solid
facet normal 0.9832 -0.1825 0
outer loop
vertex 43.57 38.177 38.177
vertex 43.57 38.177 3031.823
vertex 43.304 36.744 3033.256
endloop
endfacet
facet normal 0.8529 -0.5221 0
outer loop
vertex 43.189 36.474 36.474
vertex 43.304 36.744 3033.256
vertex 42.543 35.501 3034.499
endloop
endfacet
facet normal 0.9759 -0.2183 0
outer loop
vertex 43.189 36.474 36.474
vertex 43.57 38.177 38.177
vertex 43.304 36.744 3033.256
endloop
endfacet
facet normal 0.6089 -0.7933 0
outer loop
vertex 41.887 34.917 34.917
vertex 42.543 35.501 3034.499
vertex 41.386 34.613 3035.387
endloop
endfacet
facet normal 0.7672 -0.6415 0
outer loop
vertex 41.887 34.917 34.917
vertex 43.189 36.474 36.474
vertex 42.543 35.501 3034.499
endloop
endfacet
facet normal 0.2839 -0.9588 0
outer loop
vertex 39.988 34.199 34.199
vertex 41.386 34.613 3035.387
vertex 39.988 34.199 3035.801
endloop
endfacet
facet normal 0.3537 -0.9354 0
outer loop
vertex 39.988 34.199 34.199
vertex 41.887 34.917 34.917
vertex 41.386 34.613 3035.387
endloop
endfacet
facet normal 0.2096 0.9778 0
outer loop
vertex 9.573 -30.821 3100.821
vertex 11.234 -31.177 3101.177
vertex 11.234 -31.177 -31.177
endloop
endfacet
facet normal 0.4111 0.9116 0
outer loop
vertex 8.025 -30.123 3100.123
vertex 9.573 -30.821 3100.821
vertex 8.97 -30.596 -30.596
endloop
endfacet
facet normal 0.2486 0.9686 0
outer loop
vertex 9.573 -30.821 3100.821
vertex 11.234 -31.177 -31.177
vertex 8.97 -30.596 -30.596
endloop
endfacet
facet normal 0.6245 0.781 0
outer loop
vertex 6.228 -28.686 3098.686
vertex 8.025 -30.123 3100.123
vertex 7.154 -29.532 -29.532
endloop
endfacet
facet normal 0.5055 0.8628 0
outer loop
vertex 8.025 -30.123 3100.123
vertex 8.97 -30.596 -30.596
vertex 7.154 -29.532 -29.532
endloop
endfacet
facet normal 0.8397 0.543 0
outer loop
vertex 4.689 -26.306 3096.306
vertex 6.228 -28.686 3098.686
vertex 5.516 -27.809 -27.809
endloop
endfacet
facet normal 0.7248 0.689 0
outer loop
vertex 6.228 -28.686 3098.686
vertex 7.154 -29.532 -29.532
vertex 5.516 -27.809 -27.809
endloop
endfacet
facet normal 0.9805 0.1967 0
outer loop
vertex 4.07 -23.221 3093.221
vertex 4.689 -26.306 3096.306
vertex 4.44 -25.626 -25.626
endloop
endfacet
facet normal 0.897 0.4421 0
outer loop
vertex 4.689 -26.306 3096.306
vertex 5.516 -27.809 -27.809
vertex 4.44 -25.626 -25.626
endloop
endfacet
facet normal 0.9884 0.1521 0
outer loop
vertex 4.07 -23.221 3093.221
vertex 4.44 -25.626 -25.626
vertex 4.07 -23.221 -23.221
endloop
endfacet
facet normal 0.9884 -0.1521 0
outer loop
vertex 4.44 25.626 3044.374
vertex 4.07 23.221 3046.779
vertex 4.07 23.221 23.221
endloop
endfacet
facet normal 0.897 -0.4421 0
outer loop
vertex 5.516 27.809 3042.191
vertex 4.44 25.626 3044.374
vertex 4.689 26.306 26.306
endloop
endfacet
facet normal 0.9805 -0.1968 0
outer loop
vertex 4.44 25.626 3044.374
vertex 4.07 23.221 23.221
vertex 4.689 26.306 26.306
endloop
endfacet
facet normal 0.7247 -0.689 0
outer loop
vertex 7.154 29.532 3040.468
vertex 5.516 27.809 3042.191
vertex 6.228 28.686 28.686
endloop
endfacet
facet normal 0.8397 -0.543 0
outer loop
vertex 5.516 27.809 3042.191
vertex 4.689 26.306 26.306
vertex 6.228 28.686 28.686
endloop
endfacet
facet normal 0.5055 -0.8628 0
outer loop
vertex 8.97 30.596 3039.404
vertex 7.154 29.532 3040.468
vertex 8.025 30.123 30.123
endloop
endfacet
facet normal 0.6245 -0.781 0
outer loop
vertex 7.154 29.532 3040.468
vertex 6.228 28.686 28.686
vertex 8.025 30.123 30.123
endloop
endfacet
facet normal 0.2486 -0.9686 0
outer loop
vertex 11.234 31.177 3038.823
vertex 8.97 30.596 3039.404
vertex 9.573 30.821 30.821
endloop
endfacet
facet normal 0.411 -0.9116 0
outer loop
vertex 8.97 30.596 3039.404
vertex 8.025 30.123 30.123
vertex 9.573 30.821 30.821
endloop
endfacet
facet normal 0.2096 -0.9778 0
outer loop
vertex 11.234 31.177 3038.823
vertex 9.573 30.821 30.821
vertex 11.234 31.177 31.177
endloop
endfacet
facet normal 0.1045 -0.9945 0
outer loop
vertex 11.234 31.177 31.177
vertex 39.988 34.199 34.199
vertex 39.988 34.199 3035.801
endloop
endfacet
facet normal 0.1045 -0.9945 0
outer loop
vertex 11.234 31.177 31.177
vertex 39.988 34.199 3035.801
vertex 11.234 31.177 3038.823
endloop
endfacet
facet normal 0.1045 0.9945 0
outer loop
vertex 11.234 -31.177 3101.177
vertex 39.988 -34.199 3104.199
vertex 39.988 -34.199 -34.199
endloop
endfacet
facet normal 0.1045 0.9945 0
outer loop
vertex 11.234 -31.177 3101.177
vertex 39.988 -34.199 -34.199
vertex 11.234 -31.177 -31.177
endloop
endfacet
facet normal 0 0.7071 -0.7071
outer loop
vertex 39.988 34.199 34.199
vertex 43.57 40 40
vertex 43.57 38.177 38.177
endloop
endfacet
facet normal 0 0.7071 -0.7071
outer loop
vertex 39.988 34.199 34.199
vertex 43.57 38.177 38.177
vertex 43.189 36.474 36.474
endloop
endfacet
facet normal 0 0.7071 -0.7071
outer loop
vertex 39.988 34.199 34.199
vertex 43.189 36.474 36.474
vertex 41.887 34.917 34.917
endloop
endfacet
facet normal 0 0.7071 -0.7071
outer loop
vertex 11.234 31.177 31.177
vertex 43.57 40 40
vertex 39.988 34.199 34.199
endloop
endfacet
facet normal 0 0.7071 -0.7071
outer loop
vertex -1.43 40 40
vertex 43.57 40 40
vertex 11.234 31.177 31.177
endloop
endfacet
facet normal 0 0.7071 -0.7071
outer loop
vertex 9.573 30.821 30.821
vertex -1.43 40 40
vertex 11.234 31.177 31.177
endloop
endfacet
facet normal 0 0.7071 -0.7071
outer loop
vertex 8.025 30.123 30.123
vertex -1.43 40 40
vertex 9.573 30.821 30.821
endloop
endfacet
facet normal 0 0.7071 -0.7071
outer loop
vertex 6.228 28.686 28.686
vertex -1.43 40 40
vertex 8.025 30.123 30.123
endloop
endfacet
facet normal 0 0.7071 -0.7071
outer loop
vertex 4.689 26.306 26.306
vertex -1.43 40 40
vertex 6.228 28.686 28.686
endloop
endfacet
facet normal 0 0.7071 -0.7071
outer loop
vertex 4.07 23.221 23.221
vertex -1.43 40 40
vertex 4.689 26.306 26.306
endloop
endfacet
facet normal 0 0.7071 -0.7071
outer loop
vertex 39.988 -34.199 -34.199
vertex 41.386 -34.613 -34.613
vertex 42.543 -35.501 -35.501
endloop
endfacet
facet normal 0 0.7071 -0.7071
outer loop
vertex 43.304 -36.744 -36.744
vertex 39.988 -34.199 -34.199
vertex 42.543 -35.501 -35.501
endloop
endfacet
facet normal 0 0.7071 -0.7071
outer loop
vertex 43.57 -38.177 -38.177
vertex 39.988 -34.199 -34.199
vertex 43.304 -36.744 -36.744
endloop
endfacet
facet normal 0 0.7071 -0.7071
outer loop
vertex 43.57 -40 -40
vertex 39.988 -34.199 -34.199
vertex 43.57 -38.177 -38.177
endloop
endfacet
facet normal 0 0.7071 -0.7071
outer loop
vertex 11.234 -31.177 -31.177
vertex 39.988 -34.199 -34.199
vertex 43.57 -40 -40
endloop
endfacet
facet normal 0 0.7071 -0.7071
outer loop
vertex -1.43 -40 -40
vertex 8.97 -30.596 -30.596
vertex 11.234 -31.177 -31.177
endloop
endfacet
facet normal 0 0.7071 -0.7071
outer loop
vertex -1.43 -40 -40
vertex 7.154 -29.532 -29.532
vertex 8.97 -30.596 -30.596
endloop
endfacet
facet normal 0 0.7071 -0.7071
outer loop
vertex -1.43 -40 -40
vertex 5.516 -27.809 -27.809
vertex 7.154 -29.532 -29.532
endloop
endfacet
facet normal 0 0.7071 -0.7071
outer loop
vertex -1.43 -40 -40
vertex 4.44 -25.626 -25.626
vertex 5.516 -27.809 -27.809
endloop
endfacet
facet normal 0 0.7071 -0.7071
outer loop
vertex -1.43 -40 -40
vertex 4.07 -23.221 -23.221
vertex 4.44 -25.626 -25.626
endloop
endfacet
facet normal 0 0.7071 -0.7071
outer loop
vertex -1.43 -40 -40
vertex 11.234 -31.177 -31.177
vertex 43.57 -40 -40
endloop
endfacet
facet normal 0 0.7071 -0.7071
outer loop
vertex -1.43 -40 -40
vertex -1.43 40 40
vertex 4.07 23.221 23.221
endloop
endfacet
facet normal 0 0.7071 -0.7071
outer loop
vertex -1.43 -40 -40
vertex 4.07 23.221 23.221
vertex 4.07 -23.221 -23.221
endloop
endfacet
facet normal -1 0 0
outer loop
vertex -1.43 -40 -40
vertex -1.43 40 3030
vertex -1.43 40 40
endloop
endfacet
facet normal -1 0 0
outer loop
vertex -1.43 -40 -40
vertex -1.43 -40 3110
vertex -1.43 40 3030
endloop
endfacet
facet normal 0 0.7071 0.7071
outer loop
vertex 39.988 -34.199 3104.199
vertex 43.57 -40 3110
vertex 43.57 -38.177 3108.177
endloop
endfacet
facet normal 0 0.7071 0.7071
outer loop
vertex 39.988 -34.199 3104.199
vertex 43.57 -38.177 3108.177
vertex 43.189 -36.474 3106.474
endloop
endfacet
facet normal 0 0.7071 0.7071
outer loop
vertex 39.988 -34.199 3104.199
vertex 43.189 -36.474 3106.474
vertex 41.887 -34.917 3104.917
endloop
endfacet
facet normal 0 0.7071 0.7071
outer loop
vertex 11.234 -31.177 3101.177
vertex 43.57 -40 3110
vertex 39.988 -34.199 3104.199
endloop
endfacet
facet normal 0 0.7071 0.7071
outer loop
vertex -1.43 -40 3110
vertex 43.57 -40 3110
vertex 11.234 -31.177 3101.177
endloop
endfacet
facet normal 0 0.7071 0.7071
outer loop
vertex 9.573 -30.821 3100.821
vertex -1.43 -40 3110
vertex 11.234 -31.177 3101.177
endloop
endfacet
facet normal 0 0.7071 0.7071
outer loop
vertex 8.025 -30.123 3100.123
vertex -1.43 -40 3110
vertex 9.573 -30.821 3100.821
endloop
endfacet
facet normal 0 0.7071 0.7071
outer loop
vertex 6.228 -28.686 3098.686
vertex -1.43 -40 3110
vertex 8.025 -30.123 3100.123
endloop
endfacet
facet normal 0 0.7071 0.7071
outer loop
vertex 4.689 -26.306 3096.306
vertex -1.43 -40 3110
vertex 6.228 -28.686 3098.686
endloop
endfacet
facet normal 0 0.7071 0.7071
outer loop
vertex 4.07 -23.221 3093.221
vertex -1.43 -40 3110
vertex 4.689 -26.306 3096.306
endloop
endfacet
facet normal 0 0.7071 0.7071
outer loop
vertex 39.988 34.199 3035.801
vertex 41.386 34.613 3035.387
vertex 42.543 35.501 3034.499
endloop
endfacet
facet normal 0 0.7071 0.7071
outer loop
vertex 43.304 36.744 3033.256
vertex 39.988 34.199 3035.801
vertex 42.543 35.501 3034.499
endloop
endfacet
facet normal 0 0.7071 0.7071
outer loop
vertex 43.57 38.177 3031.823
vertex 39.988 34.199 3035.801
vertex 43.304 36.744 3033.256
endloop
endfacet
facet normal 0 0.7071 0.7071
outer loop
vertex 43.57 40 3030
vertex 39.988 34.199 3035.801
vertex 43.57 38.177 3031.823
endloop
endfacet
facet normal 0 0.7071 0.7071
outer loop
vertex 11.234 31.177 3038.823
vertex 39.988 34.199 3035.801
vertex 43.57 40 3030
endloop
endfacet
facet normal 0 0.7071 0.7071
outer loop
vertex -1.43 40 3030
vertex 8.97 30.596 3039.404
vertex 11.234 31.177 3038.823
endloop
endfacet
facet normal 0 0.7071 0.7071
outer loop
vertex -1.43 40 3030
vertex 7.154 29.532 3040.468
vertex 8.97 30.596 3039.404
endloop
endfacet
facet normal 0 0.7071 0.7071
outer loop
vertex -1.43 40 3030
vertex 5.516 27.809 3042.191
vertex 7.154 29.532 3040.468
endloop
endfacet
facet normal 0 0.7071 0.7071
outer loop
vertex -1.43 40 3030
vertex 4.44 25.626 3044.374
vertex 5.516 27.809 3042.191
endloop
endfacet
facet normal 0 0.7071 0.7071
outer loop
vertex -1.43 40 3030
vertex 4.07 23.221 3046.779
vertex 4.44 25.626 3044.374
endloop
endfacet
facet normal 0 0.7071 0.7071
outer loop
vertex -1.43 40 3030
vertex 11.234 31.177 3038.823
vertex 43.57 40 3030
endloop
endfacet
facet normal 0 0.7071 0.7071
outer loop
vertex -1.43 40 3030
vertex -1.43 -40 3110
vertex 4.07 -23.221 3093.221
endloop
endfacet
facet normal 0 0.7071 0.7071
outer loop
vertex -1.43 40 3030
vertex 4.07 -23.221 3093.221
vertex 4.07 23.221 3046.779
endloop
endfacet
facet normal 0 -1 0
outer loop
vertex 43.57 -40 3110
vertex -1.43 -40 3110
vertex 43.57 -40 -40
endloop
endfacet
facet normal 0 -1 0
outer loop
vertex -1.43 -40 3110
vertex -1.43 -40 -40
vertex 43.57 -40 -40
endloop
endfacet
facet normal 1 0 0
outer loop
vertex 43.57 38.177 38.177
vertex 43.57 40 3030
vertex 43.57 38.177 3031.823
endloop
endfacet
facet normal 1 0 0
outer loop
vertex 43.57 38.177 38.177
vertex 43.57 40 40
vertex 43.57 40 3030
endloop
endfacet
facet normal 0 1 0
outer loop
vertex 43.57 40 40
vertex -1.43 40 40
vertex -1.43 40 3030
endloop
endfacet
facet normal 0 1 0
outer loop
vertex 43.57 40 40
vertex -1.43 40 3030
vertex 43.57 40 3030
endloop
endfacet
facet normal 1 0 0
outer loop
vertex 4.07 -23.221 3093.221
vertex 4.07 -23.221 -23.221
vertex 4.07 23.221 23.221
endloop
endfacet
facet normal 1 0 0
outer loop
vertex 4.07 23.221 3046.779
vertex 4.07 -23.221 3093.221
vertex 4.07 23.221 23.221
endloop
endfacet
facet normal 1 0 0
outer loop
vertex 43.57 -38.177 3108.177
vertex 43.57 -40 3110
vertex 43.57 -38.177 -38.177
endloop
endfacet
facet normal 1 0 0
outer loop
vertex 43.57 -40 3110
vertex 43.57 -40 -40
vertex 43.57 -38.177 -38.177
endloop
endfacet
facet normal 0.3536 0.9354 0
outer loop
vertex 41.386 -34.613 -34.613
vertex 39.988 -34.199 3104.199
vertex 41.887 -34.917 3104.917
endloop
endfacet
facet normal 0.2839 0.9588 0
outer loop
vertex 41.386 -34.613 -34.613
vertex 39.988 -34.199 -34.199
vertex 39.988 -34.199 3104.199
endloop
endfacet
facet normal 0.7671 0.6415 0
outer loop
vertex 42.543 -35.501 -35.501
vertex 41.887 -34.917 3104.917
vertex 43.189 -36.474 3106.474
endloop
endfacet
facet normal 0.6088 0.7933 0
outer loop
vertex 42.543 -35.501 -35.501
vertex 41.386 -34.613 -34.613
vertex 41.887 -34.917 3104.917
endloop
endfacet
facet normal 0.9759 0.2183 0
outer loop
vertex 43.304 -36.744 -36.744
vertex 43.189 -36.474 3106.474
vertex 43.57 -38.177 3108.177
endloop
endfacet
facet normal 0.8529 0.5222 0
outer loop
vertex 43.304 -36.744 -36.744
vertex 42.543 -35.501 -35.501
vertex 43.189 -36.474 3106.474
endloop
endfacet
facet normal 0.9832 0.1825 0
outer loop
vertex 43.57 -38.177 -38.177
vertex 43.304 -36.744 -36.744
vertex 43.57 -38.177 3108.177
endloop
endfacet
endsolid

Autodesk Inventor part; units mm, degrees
ref_plane "Начальная плоскость" through (0, 0, -40) normal (0, 0, 1) x (1, 0, 0)
ref_plane "Конечная плоскость" through (0, 0, 3110) normal (0, 0, 1) x (1, 0, 0)
sketch "Эскиз" plane through (0, 0, 0) normal (0, 0, 1) x (1, 0, 0)
  line L0 (-1.43, 0) -> (-1.43, 40)
  line L1 (-1.43, 40) -> (43.57, 40)
  line L2 (43.57, 40) -> (43.57, 38.1774)
  line L3 (39.9881, 34.1993) -> (11.2338, 31.1771)
  line L4 (4.07, 23.221) -> (4.07, 0)
  line L5 (4.07, 0) -> (-1.43, 0) construction
  line L6 (23.82, 40) -> (23.82, 32.5) construction
  line L7 (43.57, 34.5758) -> (43.57, 32.5) construction
  line L8 (43.57, 32.5) -> (23.82, 32.5) construction
  line L9 (0, 15) -> (0, -27) construction
  line L10 (-5.539, 0) -> (16.0067, 0) construction
  line L11 (-1.43, 0) -> (-1.43, -40)
  line L12 (-1.43, -40) -> (43.57, -40)
  line L13 (43.57, -40) -> (43.57, -38.1774)
  line L14 (39.9881, -34.1993) -> (11.2338, -31.1771)
  line L15 (4.07, -23.221) -> (4.07, 0)
  arc A0 (11.2338, 31.1771) -> (4.07, 23.221) centre (12.07, 23.221) ccw
  arc A1 (4.07, -23.221) -> (11.2338, -31.1771) centre (12.07, -23.221) ccw
  arc A2 (39.9881, 34.1993) -> (43.57, 38.1774) centre (39.57, 38.1774) ccw
  arc A3 (43.57, -38.1774) -> (39.9881, -34.1993) centre (39.57, -38.1774) ccw
  line L16 (0, 56) -> (0, -56) construction
  line L17 (-15.5135, 0) -> (54.308, 0) construction
  point P0 (4.07, 30.4242)
  point P1 (43.57, -34.5758)
  point P2 (4.07, -30.4242)
  point P3 (23.82, -40)
  point P4 (23.82, -32.5)
  dimension "d0" = 5.5
  dimension "d1" = 40
  dimension "d2" = 45
  dimension "d3" = 7.5
  dimension "d4" = 19.75
  dimension "d5" = 2.0758
  dimension "d23" = 8
  dimension "d24" = 4
  dimension "d25" = 1.43
extrude "Тело" add sketch "Эскиз" along normal up to surface (3150 mm away) from surface at -40
sketch "Sketch3" plane through (0, 0, 0) normal (0, 0, 1) x (1, 0, 0)
  line L0 (0, 0) -> (10, 0)
ref_plane "Work Plane3" through (0, 0, 0) normal (0, -1, 0) x (1, 0, 0)
sketch "Sketch4" plane through (0, 0, 0) normal (0, -1, 0) x (1, 0, 0)
  line L0 (-2, -40) -> (12, -40)
  line L1 (-2, 3110) -> (12, 3110)
  dimension "d29" = 3150
ref_plane "РабПлоскость4" through (21.07, -40, -40) normal (0, 0.7071, -0.7071) x (1, 0, 0)
split "Разделение1" plane through (21.07, -40, -40) removes the side toward (0, 0.7071, -0.7071)
ref_plane "РабПлоскость5" through (21.07, -40, 3110) normal (0, 0.7071, 0.7071) x (1, 0, 0)
split "Разделение2" plane through (21.07, -40, 3110) removes the side toward (0, 0.7071, 0.7071)
equation "\"d0\" = G_T"
equation "\"d1\" = 0.5 * G_H"
equation "\"d2\" = G_W"
equation "\"d3\" = G_T1"
equation "\"d4\" = G_C"
equation "\"d23\" = G_IR"
equation "\"d24\" = G_ER"
equation "\"d25\" = ex"
equation "\"d6\" = G_L"
equation "\"G_W\" = 45"
equation "\"G_T\" = 5.5"
equation "\"G_T1\" = 7.5"
equation "\"G_NG\" = 0.105104"
equation "\"G_ER\" = 4"
equation "\"G_IR\" = 8"
equation "\"G_C\" = 19.75"
equation "\"G_L\" = d29"
equation "\"ex\" = 1.43"
equation "\"G_H\" = 80"
properties part number "ISO 657/11 - CH 80 x 8 - 3150" material "Сталь, мягкая"
